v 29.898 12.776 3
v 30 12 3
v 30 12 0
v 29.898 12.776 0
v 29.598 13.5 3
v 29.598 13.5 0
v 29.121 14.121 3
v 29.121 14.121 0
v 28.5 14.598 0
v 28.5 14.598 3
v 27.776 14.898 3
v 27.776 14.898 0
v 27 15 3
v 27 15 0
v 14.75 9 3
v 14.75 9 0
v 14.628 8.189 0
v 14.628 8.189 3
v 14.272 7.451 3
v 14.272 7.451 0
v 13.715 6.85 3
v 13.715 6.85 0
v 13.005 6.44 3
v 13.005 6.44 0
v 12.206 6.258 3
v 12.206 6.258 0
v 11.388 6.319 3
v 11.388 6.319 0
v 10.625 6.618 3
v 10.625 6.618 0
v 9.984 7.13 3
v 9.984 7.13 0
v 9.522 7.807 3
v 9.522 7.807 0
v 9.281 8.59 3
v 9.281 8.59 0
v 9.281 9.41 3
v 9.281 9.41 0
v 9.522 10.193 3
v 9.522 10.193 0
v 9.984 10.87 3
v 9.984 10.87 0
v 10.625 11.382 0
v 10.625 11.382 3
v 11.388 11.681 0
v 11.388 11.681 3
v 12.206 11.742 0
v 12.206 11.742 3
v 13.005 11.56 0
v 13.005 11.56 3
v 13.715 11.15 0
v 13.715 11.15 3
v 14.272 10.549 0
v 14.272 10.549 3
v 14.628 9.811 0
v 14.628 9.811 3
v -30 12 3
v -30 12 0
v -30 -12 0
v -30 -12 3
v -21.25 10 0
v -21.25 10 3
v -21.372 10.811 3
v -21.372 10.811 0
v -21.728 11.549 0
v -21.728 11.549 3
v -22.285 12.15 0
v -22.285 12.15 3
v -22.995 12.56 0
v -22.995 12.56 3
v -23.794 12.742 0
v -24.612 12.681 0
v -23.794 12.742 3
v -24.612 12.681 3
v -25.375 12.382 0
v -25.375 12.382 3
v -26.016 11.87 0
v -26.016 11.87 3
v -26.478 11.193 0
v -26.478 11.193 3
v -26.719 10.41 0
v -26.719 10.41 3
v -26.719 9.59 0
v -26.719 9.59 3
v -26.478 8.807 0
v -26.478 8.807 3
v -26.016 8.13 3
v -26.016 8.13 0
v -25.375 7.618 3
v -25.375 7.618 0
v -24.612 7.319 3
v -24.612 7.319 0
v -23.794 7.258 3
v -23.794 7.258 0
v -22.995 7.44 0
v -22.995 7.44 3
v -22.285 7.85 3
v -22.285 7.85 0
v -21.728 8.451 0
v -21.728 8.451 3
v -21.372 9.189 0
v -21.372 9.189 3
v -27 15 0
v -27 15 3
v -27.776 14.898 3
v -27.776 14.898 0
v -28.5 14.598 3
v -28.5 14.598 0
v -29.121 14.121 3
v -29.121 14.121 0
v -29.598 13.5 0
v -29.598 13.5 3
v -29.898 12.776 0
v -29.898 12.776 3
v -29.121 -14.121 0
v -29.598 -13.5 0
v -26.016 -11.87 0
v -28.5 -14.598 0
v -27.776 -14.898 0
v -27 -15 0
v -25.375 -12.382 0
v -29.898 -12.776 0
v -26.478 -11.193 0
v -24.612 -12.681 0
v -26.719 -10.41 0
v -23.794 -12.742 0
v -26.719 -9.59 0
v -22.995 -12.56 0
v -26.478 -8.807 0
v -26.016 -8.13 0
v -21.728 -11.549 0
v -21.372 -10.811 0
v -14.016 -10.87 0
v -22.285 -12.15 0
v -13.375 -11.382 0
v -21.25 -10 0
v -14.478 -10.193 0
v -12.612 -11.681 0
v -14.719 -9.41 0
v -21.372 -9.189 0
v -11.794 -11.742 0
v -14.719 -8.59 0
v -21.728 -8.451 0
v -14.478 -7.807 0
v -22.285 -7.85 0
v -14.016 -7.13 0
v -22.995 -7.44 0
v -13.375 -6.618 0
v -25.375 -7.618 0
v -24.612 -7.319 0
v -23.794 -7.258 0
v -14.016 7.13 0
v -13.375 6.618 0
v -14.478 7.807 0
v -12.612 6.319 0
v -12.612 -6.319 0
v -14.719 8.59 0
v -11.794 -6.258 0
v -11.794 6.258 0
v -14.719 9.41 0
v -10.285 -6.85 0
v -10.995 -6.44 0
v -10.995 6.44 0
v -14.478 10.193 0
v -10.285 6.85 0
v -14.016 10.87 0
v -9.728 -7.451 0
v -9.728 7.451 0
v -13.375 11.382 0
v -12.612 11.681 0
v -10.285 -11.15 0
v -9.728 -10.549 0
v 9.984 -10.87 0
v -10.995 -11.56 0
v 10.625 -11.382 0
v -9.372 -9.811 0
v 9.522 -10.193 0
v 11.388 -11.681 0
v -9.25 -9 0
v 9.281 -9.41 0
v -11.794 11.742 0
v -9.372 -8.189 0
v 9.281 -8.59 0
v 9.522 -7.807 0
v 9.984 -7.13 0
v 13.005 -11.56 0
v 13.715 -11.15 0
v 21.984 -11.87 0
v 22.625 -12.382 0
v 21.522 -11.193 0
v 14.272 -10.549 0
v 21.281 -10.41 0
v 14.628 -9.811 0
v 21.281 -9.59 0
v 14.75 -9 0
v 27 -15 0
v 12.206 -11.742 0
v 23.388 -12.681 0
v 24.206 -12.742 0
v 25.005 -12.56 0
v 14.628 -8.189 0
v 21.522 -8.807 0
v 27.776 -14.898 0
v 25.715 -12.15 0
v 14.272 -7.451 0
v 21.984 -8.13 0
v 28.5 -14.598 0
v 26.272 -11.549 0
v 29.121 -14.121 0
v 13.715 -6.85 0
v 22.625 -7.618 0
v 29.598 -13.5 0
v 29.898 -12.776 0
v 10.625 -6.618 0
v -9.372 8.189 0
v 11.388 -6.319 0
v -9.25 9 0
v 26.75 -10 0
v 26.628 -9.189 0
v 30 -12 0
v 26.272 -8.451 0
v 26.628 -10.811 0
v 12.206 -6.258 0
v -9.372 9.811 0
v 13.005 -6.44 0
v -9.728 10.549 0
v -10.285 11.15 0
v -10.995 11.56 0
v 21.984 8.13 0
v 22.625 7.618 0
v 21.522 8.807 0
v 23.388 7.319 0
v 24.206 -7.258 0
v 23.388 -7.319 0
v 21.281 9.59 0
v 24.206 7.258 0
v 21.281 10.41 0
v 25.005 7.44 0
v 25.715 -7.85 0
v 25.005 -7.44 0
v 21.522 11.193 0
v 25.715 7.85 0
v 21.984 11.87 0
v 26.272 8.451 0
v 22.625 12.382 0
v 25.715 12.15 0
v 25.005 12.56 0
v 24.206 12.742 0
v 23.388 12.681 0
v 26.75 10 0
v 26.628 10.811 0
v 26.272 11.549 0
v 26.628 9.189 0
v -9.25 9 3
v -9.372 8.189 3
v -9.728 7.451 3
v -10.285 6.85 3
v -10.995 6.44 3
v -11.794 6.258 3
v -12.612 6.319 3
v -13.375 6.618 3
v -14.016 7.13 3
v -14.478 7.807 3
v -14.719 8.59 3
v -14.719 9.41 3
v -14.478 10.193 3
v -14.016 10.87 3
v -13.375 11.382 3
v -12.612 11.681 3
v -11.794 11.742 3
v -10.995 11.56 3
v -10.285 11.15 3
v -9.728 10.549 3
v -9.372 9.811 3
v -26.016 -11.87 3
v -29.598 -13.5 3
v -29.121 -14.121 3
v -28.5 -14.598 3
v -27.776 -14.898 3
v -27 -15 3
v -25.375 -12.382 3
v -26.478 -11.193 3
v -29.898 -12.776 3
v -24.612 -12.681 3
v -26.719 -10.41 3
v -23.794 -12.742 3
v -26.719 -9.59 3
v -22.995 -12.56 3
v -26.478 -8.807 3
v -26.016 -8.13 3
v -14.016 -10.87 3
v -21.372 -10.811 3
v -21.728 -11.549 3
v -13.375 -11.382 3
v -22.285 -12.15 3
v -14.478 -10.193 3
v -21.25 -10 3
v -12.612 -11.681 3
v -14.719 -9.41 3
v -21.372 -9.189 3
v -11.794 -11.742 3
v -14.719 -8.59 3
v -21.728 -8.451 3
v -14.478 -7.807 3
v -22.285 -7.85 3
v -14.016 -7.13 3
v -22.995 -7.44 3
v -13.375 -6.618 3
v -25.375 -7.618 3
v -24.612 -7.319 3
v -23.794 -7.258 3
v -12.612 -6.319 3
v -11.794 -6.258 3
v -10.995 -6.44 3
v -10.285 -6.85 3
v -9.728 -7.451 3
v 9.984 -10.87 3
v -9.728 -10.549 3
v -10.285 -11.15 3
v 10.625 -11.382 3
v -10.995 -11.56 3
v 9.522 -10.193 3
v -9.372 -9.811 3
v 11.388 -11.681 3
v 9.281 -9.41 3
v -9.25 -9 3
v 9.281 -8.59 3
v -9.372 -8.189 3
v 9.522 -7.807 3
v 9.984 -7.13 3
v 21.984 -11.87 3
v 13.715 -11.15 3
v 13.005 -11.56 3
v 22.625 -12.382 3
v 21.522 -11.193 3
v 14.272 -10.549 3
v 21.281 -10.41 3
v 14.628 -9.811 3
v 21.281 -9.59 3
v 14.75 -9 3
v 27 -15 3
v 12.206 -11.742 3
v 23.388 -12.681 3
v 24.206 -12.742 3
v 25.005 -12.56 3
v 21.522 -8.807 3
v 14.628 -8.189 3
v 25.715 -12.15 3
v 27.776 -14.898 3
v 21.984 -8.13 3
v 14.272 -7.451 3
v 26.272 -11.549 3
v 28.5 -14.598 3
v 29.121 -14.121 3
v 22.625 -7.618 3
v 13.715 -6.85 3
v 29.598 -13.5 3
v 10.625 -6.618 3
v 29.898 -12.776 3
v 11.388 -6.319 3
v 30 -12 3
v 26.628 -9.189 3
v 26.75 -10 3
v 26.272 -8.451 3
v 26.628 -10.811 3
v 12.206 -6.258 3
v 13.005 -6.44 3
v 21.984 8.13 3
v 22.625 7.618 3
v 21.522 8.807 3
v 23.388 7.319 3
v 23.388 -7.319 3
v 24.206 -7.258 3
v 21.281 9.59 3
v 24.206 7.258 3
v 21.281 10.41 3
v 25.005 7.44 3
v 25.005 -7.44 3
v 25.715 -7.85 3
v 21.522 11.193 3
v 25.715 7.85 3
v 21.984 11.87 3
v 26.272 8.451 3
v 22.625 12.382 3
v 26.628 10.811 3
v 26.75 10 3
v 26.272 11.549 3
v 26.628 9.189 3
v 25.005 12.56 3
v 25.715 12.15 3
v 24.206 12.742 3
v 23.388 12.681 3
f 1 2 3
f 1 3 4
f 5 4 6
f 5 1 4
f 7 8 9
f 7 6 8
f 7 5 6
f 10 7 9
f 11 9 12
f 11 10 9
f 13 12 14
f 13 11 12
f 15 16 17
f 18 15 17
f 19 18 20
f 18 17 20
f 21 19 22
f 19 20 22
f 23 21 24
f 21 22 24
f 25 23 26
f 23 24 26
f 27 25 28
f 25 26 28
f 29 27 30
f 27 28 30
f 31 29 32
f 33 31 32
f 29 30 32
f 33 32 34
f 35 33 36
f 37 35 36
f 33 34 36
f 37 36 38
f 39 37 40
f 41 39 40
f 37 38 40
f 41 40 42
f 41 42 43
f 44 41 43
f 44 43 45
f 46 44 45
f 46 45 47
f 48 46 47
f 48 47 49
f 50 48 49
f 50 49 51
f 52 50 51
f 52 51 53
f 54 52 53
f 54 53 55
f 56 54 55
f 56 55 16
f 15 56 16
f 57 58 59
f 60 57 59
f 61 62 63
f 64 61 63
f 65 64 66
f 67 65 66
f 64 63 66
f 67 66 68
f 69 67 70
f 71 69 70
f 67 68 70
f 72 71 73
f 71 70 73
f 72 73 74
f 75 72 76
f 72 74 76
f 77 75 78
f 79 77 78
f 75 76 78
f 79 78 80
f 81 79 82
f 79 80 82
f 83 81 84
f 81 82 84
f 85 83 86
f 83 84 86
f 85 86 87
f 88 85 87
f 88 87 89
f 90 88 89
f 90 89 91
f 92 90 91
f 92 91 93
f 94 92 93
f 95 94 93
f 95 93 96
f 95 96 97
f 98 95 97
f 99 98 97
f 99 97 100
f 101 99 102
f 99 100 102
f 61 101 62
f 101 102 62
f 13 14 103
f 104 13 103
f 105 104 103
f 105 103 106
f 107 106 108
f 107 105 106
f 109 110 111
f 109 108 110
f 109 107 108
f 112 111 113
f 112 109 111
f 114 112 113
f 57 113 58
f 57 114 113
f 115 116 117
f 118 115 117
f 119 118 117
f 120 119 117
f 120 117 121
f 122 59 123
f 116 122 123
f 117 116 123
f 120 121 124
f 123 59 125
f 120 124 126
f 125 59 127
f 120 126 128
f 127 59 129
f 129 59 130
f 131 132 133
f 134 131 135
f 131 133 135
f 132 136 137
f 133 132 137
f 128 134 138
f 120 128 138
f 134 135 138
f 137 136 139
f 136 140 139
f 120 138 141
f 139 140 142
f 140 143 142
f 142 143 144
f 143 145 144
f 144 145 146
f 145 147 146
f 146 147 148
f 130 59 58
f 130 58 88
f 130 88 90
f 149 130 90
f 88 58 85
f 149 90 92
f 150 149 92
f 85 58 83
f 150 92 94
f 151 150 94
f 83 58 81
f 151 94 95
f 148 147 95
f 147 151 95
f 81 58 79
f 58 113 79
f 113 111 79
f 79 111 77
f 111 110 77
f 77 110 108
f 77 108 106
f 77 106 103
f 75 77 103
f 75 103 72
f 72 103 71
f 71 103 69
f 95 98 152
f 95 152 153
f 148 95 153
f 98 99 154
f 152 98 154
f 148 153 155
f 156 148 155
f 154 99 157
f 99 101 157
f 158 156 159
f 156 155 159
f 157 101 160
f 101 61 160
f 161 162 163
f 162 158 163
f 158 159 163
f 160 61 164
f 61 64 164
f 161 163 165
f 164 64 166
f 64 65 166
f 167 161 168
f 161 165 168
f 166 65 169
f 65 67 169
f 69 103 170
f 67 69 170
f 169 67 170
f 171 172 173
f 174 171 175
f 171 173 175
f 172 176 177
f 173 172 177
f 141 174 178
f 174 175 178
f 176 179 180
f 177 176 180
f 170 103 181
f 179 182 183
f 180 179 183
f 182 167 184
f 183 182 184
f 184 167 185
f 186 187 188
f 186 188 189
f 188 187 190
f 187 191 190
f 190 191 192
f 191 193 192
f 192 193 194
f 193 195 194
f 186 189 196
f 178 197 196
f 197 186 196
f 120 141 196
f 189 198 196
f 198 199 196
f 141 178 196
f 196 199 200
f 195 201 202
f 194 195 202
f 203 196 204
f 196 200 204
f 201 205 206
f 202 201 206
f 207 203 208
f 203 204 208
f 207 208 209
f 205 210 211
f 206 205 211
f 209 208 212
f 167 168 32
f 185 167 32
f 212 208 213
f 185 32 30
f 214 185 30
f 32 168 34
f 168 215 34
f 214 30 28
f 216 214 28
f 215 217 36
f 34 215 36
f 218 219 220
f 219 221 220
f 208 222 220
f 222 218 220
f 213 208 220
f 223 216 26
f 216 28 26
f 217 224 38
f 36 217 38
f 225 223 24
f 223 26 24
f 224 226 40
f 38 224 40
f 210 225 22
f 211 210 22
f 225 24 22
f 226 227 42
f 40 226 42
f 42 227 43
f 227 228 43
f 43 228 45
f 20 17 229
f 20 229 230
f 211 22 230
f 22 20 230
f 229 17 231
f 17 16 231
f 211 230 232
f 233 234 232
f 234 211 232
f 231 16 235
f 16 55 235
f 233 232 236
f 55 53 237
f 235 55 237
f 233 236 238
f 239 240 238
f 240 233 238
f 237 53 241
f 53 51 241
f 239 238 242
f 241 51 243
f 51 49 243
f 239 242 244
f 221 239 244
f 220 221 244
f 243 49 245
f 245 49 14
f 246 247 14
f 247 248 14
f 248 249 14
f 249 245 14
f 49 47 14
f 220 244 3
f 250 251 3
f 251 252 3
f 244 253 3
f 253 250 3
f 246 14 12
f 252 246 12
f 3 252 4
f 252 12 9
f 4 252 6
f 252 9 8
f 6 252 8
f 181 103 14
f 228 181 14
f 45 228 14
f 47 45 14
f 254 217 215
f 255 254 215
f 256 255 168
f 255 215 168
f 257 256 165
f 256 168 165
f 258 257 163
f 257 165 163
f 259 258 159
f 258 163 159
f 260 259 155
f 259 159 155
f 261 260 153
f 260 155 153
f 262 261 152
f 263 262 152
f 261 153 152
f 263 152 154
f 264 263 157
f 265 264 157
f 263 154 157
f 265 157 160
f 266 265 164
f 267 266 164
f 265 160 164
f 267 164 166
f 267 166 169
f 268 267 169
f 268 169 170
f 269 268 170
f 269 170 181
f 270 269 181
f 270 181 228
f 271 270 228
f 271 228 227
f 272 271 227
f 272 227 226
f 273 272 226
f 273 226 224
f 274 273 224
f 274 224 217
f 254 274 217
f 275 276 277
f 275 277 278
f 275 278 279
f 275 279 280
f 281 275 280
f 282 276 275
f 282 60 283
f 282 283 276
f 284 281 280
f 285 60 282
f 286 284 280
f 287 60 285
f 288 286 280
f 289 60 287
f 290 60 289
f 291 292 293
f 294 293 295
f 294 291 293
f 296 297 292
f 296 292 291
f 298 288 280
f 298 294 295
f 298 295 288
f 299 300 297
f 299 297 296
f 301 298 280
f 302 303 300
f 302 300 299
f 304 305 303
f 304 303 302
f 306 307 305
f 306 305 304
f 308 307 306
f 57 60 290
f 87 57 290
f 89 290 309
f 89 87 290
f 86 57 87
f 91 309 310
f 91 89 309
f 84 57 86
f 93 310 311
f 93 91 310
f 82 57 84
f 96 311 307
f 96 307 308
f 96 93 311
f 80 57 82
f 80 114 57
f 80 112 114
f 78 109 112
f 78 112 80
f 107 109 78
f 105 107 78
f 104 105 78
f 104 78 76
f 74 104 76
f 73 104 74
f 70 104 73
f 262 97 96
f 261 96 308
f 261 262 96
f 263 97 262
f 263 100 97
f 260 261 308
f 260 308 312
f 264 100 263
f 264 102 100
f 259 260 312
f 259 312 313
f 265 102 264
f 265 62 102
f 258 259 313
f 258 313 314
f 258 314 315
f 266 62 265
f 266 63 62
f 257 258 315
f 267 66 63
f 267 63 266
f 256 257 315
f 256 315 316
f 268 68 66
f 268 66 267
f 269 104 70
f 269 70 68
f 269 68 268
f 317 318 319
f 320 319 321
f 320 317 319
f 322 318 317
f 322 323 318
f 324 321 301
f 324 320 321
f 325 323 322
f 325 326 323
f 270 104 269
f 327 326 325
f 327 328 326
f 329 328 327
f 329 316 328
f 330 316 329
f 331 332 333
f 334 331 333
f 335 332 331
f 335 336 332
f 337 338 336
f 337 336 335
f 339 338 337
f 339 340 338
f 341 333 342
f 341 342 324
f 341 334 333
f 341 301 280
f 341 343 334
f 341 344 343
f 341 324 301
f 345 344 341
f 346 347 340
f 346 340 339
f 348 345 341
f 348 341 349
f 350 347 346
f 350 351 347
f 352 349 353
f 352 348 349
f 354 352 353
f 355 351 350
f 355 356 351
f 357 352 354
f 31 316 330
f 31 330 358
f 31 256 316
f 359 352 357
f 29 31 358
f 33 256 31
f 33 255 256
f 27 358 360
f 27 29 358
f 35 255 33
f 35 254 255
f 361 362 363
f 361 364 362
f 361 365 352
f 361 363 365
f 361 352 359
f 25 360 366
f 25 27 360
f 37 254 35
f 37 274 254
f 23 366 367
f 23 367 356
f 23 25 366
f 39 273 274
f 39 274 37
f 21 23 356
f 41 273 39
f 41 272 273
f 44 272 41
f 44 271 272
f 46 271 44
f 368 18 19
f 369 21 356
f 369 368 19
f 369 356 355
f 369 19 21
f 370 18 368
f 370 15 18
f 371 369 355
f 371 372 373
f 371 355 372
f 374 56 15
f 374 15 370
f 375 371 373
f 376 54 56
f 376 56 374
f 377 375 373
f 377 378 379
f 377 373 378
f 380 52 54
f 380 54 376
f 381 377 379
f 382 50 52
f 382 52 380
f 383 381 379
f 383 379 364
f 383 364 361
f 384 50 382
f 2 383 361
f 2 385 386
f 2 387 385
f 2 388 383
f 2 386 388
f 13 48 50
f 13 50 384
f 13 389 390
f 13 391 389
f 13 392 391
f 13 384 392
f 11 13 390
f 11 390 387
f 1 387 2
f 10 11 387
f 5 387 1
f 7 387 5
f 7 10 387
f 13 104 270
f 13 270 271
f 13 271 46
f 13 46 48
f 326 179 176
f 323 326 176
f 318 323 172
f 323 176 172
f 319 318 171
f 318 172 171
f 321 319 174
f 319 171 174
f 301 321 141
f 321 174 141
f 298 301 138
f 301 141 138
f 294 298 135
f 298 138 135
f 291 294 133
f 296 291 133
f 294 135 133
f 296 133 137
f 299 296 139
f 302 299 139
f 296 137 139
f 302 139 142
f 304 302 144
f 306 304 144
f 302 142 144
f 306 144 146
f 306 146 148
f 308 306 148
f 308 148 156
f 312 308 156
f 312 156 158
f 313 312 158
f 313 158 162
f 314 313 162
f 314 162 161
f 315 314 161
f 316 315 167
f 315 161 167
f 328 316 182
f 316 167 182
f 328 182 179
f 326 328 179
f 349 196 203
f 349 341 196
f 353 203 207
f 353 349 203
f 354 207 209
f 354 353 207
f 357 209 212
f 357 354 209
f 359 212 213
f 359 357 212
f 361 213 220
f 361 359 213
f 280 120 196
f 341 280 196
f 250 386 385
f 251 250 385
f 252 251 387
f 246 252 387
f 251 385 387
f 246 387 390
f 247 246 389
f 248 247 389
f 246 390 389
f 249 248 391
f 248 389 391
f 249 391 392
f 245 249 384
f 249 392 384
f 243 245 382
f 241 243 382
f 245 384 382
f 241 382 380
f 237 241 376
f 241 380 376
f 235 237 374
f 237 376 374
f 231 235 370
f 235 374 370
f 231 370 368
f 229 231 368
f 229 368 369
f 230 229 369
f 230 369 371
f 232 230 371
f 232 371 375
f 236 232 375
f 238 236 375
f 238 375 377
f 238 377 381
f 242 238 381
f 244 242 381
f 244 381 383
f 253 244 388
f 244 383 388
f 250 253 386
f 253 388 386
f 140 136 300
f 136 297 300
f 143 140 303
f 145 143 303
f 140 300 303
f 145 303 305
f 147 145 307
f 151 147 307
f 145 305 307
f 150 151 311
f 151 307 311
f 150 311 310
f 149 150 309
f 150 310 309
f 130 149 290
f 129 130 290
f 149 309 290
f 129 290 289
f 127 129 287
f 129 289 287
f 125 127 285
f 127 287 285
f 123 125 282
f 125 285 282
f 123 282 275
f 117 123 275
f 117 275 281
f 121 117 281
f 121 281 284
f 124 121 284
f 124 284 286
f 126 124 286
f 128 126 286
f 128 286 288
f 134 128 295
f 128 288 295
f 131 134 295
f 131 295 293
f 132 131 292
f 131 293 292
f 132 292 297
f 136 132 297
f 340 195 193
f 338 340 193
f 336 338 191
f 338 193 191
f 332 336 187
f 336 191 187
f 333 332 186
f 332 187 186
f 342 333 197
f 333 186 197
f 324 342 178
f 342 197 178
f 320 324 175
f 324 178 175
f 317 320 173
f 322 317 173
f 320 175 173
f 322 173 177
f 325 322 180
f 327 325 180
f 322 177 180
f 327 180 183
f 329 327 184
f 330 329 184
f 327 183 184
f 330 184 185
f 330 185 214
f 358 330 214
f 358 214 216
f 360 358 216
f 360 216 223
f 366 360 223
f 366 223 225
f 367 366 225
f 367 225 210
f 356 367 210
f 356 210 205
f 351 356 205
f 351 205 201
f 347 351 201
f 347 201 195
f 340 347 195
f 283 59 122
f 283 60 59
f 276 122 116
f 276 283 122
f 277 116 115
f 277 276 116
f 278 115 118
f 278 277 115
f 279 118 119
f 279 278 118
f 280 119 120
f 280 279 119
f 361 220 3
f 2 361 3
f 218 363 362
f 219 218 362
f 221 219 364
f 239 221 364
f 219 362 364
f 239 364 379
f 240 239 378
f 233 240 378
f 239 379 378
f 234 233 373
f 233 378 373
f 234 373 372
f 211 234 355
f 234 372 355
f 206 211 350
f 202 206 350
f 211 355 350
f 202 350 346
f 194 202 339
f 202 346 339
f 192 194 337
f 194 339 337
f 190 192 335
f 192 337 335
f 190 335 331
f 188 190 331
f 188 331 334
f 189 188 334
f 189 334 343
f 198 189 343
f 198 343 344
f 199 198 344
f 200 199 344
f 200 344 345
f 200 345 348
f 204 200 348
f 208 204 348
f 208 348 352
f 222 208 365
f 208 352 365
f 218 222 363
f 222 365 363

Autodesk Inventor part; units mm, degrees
ref_plane "YZ Plane" through (0, 0, 0) normal (1, 0, 0) x (0, 1, 0)
ref_plane "XZ Plane" through (0, 0, 0) normal (0, 1, 0) x (-1, 0, 0)
ref_plane "XY Plane" through (0, 0, 0) normal (0, 0, 1) x (1, 0, 0)
sketch "Sketch1" plane through (0, 0, 0) normal (0, 0, 1) x (1, 0, 0)
  line L0 (-30, -15) -> (30, -15)
  line L1 (30, -15) -> (30, 15)
  line L2 (30, 15) -> (-30, 15)
  line L3 (-30, 15) -> (-30, -15)
  line L4 (-30, -15) -> (30, 15) construction
  line L5 (30, -15) -> (-30, 15) construction
  line L6 (-12, -9) -> (12, -9)
  line L7 (12, -9) -> (12, 9)
  line L8 (12, 9) -> (-12, 9)
  line L9 (-12, 9) -> (-12, -9)
  line L10 (-12, -9) -> (12, 9) construction
  line L11 (12, -9) -> (-12, 9) construction
  circle A0 centre (-12, 9) radius 2.75
  circle A1 centre (12, 9) radius 2.75
  circle A2 centre (-12, -9) radius 2.75
  circle A3 centre (12, -9) radius 2.75
  point P0 (0, 0)
  dimension "d0" = 60
  dimension "d1" = 30
  dimension "d2" = 24
  dimension "d3" = 18
  dimension "d4" = 5.5
  dimension "d5" = 5.5
  dimension "d6" = 5.5
  dimension "d7" = 5.5
extrude "Extrusion1" add sketch "Sketch1" along normal blind 3 contours L3 L2 L1 L0 | A2 L9 A0 L8 A1 L7 A3 L6
sketch "Sketch2" plane through (0, 0, 3) normal (0, 0, 1) x (1, 0, 0)
  circle A0 centre (-24, 10) radius 2.75
  circle A1 centre (-24, -10) radius 2.75
  line L0 (-30, 15) -> (-30, -15) projected
  circle A2 centre (24, 10) radius 2.75
  circle A3 centre (24, -10) radius 2.75
  line L1 (30, -15) -> (30, 15) projected
  point P0 (0, 0)
  dimension "d10" = 5.5
  dimension "d11" = 5.5
  dimension "d12" = 10
  dimension "d13" = 6
  dimension "d14" = 6
  dimension "d15" = 10
  dimension "d16" = 5.5
  dimension "d17" = 5.5
  dimension "d18" = 20
  dimension "d19" = 10
  dimension "d20" = 6
  dimension "d21" = 6
extrude "Extrusion2" cut sketch "Sketch2" against normal blind 3
fillet "Fillet1" radius 3 4 edges at (30, 15, 1.5) (30, -15, 1.5) (-30, -15, 1.5) (-30, 15, 1.5)
properties part number "De lot vitme"
